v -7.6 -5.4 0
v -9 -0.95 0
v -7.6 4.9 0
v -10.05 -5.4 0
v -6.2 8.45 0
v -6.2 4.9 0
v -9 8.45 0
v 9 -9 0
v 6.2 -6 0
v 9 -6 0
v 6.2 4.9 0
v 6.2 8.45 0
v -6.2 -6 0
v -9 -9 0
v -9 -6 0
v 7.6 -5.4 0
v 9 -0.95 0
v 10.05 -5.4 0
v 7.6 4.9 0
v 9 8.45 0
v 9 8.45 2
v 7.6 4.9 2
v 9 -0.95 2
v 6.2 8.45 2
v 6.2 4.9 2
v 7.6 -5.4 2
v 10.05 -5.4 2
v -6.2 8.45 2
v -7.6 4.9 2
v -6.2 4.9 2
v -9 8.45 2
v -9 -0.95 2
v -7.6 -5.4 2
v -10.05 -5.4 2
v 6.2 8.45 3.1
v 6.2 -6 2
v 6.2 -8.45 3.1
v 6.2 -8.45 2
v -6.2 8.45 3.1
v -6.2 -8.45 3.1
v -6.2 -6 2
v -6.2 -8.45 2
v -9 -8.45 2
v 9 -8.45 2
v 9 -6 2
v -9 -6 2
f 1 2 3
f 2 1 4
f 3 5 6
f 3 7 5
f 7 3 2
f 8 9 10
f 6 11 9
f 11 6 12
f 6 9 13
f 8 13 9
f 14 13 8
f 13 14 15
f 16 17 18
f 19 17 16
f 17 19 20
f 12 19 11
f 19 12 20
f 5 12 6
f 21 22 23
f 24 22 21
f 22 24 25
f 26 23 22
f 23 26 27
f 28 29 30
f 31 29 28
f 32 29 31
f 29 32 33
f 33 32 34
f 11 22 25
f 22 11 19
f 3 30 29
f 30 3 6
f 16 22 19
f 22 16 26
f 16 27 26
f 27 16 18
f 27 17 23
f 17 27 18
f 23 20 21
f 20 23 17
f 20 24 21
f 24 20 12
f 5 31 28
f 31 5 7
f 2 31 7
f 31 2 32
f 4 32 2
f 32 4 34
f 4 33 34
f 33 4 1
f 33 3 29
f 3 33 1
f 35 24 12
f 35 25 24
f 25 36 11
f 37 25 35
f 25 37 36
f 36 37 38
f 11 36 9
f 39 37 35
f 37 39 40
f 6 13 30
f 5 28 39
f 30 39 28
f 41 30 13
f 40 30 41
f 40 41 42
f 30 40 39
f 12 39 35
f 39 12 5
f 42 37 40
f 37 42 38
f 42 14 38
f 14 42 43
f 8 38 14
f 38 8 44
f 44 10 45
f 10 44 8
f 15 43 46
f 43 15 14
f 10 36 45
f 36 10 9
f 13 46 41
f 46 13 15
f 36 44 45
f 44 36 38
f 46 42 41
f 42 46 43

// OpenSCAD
//hole 1 coords
hole1c = [0,-2,-1];

//hole 2 coords
hole2c = [0,2,-1];

//hole radius
hr = 1;

module flashspacer() {
$fn = 40;
difference()
{

	union() {
		linear_extrude(
			height = 2,
			convexity = 4
		) polygon(
			points = [
				// Right-Hand Wing
				[7.6, 4.9], [7.6, -5.4], [10.05, -5.4], [9, -0.95], [9, 8.45],
				// Left-Hand Wing
				[-9, 8.45], [-9, -0.95], [-10.05, -5.4], [-7.6, -5.4], [-7.6, 4.9]
			],
			paths = [
				[0,1,2,3,4,5,6,7,8,9]
			],
			convexity = 4
		);
		translate(v = [-6.2, -8.45, 0])
			cube(size = [12.4, 16.9, 3.1]);
		rotate(a = [0, -90, 0])
			linear_extrude(height = 18, center = true)
			polygon(
				points = [[0, -6],[0, -9],[2, -8.45],[2, -6]],
				paths = [[0,1,2,3]]
			);
	}
/*
translate(hole1c)
cylinder(r=hr, h=10);


translate(hole2c)
cylinder(r=hr, h=10);

*/
}
}

flashspacer();
